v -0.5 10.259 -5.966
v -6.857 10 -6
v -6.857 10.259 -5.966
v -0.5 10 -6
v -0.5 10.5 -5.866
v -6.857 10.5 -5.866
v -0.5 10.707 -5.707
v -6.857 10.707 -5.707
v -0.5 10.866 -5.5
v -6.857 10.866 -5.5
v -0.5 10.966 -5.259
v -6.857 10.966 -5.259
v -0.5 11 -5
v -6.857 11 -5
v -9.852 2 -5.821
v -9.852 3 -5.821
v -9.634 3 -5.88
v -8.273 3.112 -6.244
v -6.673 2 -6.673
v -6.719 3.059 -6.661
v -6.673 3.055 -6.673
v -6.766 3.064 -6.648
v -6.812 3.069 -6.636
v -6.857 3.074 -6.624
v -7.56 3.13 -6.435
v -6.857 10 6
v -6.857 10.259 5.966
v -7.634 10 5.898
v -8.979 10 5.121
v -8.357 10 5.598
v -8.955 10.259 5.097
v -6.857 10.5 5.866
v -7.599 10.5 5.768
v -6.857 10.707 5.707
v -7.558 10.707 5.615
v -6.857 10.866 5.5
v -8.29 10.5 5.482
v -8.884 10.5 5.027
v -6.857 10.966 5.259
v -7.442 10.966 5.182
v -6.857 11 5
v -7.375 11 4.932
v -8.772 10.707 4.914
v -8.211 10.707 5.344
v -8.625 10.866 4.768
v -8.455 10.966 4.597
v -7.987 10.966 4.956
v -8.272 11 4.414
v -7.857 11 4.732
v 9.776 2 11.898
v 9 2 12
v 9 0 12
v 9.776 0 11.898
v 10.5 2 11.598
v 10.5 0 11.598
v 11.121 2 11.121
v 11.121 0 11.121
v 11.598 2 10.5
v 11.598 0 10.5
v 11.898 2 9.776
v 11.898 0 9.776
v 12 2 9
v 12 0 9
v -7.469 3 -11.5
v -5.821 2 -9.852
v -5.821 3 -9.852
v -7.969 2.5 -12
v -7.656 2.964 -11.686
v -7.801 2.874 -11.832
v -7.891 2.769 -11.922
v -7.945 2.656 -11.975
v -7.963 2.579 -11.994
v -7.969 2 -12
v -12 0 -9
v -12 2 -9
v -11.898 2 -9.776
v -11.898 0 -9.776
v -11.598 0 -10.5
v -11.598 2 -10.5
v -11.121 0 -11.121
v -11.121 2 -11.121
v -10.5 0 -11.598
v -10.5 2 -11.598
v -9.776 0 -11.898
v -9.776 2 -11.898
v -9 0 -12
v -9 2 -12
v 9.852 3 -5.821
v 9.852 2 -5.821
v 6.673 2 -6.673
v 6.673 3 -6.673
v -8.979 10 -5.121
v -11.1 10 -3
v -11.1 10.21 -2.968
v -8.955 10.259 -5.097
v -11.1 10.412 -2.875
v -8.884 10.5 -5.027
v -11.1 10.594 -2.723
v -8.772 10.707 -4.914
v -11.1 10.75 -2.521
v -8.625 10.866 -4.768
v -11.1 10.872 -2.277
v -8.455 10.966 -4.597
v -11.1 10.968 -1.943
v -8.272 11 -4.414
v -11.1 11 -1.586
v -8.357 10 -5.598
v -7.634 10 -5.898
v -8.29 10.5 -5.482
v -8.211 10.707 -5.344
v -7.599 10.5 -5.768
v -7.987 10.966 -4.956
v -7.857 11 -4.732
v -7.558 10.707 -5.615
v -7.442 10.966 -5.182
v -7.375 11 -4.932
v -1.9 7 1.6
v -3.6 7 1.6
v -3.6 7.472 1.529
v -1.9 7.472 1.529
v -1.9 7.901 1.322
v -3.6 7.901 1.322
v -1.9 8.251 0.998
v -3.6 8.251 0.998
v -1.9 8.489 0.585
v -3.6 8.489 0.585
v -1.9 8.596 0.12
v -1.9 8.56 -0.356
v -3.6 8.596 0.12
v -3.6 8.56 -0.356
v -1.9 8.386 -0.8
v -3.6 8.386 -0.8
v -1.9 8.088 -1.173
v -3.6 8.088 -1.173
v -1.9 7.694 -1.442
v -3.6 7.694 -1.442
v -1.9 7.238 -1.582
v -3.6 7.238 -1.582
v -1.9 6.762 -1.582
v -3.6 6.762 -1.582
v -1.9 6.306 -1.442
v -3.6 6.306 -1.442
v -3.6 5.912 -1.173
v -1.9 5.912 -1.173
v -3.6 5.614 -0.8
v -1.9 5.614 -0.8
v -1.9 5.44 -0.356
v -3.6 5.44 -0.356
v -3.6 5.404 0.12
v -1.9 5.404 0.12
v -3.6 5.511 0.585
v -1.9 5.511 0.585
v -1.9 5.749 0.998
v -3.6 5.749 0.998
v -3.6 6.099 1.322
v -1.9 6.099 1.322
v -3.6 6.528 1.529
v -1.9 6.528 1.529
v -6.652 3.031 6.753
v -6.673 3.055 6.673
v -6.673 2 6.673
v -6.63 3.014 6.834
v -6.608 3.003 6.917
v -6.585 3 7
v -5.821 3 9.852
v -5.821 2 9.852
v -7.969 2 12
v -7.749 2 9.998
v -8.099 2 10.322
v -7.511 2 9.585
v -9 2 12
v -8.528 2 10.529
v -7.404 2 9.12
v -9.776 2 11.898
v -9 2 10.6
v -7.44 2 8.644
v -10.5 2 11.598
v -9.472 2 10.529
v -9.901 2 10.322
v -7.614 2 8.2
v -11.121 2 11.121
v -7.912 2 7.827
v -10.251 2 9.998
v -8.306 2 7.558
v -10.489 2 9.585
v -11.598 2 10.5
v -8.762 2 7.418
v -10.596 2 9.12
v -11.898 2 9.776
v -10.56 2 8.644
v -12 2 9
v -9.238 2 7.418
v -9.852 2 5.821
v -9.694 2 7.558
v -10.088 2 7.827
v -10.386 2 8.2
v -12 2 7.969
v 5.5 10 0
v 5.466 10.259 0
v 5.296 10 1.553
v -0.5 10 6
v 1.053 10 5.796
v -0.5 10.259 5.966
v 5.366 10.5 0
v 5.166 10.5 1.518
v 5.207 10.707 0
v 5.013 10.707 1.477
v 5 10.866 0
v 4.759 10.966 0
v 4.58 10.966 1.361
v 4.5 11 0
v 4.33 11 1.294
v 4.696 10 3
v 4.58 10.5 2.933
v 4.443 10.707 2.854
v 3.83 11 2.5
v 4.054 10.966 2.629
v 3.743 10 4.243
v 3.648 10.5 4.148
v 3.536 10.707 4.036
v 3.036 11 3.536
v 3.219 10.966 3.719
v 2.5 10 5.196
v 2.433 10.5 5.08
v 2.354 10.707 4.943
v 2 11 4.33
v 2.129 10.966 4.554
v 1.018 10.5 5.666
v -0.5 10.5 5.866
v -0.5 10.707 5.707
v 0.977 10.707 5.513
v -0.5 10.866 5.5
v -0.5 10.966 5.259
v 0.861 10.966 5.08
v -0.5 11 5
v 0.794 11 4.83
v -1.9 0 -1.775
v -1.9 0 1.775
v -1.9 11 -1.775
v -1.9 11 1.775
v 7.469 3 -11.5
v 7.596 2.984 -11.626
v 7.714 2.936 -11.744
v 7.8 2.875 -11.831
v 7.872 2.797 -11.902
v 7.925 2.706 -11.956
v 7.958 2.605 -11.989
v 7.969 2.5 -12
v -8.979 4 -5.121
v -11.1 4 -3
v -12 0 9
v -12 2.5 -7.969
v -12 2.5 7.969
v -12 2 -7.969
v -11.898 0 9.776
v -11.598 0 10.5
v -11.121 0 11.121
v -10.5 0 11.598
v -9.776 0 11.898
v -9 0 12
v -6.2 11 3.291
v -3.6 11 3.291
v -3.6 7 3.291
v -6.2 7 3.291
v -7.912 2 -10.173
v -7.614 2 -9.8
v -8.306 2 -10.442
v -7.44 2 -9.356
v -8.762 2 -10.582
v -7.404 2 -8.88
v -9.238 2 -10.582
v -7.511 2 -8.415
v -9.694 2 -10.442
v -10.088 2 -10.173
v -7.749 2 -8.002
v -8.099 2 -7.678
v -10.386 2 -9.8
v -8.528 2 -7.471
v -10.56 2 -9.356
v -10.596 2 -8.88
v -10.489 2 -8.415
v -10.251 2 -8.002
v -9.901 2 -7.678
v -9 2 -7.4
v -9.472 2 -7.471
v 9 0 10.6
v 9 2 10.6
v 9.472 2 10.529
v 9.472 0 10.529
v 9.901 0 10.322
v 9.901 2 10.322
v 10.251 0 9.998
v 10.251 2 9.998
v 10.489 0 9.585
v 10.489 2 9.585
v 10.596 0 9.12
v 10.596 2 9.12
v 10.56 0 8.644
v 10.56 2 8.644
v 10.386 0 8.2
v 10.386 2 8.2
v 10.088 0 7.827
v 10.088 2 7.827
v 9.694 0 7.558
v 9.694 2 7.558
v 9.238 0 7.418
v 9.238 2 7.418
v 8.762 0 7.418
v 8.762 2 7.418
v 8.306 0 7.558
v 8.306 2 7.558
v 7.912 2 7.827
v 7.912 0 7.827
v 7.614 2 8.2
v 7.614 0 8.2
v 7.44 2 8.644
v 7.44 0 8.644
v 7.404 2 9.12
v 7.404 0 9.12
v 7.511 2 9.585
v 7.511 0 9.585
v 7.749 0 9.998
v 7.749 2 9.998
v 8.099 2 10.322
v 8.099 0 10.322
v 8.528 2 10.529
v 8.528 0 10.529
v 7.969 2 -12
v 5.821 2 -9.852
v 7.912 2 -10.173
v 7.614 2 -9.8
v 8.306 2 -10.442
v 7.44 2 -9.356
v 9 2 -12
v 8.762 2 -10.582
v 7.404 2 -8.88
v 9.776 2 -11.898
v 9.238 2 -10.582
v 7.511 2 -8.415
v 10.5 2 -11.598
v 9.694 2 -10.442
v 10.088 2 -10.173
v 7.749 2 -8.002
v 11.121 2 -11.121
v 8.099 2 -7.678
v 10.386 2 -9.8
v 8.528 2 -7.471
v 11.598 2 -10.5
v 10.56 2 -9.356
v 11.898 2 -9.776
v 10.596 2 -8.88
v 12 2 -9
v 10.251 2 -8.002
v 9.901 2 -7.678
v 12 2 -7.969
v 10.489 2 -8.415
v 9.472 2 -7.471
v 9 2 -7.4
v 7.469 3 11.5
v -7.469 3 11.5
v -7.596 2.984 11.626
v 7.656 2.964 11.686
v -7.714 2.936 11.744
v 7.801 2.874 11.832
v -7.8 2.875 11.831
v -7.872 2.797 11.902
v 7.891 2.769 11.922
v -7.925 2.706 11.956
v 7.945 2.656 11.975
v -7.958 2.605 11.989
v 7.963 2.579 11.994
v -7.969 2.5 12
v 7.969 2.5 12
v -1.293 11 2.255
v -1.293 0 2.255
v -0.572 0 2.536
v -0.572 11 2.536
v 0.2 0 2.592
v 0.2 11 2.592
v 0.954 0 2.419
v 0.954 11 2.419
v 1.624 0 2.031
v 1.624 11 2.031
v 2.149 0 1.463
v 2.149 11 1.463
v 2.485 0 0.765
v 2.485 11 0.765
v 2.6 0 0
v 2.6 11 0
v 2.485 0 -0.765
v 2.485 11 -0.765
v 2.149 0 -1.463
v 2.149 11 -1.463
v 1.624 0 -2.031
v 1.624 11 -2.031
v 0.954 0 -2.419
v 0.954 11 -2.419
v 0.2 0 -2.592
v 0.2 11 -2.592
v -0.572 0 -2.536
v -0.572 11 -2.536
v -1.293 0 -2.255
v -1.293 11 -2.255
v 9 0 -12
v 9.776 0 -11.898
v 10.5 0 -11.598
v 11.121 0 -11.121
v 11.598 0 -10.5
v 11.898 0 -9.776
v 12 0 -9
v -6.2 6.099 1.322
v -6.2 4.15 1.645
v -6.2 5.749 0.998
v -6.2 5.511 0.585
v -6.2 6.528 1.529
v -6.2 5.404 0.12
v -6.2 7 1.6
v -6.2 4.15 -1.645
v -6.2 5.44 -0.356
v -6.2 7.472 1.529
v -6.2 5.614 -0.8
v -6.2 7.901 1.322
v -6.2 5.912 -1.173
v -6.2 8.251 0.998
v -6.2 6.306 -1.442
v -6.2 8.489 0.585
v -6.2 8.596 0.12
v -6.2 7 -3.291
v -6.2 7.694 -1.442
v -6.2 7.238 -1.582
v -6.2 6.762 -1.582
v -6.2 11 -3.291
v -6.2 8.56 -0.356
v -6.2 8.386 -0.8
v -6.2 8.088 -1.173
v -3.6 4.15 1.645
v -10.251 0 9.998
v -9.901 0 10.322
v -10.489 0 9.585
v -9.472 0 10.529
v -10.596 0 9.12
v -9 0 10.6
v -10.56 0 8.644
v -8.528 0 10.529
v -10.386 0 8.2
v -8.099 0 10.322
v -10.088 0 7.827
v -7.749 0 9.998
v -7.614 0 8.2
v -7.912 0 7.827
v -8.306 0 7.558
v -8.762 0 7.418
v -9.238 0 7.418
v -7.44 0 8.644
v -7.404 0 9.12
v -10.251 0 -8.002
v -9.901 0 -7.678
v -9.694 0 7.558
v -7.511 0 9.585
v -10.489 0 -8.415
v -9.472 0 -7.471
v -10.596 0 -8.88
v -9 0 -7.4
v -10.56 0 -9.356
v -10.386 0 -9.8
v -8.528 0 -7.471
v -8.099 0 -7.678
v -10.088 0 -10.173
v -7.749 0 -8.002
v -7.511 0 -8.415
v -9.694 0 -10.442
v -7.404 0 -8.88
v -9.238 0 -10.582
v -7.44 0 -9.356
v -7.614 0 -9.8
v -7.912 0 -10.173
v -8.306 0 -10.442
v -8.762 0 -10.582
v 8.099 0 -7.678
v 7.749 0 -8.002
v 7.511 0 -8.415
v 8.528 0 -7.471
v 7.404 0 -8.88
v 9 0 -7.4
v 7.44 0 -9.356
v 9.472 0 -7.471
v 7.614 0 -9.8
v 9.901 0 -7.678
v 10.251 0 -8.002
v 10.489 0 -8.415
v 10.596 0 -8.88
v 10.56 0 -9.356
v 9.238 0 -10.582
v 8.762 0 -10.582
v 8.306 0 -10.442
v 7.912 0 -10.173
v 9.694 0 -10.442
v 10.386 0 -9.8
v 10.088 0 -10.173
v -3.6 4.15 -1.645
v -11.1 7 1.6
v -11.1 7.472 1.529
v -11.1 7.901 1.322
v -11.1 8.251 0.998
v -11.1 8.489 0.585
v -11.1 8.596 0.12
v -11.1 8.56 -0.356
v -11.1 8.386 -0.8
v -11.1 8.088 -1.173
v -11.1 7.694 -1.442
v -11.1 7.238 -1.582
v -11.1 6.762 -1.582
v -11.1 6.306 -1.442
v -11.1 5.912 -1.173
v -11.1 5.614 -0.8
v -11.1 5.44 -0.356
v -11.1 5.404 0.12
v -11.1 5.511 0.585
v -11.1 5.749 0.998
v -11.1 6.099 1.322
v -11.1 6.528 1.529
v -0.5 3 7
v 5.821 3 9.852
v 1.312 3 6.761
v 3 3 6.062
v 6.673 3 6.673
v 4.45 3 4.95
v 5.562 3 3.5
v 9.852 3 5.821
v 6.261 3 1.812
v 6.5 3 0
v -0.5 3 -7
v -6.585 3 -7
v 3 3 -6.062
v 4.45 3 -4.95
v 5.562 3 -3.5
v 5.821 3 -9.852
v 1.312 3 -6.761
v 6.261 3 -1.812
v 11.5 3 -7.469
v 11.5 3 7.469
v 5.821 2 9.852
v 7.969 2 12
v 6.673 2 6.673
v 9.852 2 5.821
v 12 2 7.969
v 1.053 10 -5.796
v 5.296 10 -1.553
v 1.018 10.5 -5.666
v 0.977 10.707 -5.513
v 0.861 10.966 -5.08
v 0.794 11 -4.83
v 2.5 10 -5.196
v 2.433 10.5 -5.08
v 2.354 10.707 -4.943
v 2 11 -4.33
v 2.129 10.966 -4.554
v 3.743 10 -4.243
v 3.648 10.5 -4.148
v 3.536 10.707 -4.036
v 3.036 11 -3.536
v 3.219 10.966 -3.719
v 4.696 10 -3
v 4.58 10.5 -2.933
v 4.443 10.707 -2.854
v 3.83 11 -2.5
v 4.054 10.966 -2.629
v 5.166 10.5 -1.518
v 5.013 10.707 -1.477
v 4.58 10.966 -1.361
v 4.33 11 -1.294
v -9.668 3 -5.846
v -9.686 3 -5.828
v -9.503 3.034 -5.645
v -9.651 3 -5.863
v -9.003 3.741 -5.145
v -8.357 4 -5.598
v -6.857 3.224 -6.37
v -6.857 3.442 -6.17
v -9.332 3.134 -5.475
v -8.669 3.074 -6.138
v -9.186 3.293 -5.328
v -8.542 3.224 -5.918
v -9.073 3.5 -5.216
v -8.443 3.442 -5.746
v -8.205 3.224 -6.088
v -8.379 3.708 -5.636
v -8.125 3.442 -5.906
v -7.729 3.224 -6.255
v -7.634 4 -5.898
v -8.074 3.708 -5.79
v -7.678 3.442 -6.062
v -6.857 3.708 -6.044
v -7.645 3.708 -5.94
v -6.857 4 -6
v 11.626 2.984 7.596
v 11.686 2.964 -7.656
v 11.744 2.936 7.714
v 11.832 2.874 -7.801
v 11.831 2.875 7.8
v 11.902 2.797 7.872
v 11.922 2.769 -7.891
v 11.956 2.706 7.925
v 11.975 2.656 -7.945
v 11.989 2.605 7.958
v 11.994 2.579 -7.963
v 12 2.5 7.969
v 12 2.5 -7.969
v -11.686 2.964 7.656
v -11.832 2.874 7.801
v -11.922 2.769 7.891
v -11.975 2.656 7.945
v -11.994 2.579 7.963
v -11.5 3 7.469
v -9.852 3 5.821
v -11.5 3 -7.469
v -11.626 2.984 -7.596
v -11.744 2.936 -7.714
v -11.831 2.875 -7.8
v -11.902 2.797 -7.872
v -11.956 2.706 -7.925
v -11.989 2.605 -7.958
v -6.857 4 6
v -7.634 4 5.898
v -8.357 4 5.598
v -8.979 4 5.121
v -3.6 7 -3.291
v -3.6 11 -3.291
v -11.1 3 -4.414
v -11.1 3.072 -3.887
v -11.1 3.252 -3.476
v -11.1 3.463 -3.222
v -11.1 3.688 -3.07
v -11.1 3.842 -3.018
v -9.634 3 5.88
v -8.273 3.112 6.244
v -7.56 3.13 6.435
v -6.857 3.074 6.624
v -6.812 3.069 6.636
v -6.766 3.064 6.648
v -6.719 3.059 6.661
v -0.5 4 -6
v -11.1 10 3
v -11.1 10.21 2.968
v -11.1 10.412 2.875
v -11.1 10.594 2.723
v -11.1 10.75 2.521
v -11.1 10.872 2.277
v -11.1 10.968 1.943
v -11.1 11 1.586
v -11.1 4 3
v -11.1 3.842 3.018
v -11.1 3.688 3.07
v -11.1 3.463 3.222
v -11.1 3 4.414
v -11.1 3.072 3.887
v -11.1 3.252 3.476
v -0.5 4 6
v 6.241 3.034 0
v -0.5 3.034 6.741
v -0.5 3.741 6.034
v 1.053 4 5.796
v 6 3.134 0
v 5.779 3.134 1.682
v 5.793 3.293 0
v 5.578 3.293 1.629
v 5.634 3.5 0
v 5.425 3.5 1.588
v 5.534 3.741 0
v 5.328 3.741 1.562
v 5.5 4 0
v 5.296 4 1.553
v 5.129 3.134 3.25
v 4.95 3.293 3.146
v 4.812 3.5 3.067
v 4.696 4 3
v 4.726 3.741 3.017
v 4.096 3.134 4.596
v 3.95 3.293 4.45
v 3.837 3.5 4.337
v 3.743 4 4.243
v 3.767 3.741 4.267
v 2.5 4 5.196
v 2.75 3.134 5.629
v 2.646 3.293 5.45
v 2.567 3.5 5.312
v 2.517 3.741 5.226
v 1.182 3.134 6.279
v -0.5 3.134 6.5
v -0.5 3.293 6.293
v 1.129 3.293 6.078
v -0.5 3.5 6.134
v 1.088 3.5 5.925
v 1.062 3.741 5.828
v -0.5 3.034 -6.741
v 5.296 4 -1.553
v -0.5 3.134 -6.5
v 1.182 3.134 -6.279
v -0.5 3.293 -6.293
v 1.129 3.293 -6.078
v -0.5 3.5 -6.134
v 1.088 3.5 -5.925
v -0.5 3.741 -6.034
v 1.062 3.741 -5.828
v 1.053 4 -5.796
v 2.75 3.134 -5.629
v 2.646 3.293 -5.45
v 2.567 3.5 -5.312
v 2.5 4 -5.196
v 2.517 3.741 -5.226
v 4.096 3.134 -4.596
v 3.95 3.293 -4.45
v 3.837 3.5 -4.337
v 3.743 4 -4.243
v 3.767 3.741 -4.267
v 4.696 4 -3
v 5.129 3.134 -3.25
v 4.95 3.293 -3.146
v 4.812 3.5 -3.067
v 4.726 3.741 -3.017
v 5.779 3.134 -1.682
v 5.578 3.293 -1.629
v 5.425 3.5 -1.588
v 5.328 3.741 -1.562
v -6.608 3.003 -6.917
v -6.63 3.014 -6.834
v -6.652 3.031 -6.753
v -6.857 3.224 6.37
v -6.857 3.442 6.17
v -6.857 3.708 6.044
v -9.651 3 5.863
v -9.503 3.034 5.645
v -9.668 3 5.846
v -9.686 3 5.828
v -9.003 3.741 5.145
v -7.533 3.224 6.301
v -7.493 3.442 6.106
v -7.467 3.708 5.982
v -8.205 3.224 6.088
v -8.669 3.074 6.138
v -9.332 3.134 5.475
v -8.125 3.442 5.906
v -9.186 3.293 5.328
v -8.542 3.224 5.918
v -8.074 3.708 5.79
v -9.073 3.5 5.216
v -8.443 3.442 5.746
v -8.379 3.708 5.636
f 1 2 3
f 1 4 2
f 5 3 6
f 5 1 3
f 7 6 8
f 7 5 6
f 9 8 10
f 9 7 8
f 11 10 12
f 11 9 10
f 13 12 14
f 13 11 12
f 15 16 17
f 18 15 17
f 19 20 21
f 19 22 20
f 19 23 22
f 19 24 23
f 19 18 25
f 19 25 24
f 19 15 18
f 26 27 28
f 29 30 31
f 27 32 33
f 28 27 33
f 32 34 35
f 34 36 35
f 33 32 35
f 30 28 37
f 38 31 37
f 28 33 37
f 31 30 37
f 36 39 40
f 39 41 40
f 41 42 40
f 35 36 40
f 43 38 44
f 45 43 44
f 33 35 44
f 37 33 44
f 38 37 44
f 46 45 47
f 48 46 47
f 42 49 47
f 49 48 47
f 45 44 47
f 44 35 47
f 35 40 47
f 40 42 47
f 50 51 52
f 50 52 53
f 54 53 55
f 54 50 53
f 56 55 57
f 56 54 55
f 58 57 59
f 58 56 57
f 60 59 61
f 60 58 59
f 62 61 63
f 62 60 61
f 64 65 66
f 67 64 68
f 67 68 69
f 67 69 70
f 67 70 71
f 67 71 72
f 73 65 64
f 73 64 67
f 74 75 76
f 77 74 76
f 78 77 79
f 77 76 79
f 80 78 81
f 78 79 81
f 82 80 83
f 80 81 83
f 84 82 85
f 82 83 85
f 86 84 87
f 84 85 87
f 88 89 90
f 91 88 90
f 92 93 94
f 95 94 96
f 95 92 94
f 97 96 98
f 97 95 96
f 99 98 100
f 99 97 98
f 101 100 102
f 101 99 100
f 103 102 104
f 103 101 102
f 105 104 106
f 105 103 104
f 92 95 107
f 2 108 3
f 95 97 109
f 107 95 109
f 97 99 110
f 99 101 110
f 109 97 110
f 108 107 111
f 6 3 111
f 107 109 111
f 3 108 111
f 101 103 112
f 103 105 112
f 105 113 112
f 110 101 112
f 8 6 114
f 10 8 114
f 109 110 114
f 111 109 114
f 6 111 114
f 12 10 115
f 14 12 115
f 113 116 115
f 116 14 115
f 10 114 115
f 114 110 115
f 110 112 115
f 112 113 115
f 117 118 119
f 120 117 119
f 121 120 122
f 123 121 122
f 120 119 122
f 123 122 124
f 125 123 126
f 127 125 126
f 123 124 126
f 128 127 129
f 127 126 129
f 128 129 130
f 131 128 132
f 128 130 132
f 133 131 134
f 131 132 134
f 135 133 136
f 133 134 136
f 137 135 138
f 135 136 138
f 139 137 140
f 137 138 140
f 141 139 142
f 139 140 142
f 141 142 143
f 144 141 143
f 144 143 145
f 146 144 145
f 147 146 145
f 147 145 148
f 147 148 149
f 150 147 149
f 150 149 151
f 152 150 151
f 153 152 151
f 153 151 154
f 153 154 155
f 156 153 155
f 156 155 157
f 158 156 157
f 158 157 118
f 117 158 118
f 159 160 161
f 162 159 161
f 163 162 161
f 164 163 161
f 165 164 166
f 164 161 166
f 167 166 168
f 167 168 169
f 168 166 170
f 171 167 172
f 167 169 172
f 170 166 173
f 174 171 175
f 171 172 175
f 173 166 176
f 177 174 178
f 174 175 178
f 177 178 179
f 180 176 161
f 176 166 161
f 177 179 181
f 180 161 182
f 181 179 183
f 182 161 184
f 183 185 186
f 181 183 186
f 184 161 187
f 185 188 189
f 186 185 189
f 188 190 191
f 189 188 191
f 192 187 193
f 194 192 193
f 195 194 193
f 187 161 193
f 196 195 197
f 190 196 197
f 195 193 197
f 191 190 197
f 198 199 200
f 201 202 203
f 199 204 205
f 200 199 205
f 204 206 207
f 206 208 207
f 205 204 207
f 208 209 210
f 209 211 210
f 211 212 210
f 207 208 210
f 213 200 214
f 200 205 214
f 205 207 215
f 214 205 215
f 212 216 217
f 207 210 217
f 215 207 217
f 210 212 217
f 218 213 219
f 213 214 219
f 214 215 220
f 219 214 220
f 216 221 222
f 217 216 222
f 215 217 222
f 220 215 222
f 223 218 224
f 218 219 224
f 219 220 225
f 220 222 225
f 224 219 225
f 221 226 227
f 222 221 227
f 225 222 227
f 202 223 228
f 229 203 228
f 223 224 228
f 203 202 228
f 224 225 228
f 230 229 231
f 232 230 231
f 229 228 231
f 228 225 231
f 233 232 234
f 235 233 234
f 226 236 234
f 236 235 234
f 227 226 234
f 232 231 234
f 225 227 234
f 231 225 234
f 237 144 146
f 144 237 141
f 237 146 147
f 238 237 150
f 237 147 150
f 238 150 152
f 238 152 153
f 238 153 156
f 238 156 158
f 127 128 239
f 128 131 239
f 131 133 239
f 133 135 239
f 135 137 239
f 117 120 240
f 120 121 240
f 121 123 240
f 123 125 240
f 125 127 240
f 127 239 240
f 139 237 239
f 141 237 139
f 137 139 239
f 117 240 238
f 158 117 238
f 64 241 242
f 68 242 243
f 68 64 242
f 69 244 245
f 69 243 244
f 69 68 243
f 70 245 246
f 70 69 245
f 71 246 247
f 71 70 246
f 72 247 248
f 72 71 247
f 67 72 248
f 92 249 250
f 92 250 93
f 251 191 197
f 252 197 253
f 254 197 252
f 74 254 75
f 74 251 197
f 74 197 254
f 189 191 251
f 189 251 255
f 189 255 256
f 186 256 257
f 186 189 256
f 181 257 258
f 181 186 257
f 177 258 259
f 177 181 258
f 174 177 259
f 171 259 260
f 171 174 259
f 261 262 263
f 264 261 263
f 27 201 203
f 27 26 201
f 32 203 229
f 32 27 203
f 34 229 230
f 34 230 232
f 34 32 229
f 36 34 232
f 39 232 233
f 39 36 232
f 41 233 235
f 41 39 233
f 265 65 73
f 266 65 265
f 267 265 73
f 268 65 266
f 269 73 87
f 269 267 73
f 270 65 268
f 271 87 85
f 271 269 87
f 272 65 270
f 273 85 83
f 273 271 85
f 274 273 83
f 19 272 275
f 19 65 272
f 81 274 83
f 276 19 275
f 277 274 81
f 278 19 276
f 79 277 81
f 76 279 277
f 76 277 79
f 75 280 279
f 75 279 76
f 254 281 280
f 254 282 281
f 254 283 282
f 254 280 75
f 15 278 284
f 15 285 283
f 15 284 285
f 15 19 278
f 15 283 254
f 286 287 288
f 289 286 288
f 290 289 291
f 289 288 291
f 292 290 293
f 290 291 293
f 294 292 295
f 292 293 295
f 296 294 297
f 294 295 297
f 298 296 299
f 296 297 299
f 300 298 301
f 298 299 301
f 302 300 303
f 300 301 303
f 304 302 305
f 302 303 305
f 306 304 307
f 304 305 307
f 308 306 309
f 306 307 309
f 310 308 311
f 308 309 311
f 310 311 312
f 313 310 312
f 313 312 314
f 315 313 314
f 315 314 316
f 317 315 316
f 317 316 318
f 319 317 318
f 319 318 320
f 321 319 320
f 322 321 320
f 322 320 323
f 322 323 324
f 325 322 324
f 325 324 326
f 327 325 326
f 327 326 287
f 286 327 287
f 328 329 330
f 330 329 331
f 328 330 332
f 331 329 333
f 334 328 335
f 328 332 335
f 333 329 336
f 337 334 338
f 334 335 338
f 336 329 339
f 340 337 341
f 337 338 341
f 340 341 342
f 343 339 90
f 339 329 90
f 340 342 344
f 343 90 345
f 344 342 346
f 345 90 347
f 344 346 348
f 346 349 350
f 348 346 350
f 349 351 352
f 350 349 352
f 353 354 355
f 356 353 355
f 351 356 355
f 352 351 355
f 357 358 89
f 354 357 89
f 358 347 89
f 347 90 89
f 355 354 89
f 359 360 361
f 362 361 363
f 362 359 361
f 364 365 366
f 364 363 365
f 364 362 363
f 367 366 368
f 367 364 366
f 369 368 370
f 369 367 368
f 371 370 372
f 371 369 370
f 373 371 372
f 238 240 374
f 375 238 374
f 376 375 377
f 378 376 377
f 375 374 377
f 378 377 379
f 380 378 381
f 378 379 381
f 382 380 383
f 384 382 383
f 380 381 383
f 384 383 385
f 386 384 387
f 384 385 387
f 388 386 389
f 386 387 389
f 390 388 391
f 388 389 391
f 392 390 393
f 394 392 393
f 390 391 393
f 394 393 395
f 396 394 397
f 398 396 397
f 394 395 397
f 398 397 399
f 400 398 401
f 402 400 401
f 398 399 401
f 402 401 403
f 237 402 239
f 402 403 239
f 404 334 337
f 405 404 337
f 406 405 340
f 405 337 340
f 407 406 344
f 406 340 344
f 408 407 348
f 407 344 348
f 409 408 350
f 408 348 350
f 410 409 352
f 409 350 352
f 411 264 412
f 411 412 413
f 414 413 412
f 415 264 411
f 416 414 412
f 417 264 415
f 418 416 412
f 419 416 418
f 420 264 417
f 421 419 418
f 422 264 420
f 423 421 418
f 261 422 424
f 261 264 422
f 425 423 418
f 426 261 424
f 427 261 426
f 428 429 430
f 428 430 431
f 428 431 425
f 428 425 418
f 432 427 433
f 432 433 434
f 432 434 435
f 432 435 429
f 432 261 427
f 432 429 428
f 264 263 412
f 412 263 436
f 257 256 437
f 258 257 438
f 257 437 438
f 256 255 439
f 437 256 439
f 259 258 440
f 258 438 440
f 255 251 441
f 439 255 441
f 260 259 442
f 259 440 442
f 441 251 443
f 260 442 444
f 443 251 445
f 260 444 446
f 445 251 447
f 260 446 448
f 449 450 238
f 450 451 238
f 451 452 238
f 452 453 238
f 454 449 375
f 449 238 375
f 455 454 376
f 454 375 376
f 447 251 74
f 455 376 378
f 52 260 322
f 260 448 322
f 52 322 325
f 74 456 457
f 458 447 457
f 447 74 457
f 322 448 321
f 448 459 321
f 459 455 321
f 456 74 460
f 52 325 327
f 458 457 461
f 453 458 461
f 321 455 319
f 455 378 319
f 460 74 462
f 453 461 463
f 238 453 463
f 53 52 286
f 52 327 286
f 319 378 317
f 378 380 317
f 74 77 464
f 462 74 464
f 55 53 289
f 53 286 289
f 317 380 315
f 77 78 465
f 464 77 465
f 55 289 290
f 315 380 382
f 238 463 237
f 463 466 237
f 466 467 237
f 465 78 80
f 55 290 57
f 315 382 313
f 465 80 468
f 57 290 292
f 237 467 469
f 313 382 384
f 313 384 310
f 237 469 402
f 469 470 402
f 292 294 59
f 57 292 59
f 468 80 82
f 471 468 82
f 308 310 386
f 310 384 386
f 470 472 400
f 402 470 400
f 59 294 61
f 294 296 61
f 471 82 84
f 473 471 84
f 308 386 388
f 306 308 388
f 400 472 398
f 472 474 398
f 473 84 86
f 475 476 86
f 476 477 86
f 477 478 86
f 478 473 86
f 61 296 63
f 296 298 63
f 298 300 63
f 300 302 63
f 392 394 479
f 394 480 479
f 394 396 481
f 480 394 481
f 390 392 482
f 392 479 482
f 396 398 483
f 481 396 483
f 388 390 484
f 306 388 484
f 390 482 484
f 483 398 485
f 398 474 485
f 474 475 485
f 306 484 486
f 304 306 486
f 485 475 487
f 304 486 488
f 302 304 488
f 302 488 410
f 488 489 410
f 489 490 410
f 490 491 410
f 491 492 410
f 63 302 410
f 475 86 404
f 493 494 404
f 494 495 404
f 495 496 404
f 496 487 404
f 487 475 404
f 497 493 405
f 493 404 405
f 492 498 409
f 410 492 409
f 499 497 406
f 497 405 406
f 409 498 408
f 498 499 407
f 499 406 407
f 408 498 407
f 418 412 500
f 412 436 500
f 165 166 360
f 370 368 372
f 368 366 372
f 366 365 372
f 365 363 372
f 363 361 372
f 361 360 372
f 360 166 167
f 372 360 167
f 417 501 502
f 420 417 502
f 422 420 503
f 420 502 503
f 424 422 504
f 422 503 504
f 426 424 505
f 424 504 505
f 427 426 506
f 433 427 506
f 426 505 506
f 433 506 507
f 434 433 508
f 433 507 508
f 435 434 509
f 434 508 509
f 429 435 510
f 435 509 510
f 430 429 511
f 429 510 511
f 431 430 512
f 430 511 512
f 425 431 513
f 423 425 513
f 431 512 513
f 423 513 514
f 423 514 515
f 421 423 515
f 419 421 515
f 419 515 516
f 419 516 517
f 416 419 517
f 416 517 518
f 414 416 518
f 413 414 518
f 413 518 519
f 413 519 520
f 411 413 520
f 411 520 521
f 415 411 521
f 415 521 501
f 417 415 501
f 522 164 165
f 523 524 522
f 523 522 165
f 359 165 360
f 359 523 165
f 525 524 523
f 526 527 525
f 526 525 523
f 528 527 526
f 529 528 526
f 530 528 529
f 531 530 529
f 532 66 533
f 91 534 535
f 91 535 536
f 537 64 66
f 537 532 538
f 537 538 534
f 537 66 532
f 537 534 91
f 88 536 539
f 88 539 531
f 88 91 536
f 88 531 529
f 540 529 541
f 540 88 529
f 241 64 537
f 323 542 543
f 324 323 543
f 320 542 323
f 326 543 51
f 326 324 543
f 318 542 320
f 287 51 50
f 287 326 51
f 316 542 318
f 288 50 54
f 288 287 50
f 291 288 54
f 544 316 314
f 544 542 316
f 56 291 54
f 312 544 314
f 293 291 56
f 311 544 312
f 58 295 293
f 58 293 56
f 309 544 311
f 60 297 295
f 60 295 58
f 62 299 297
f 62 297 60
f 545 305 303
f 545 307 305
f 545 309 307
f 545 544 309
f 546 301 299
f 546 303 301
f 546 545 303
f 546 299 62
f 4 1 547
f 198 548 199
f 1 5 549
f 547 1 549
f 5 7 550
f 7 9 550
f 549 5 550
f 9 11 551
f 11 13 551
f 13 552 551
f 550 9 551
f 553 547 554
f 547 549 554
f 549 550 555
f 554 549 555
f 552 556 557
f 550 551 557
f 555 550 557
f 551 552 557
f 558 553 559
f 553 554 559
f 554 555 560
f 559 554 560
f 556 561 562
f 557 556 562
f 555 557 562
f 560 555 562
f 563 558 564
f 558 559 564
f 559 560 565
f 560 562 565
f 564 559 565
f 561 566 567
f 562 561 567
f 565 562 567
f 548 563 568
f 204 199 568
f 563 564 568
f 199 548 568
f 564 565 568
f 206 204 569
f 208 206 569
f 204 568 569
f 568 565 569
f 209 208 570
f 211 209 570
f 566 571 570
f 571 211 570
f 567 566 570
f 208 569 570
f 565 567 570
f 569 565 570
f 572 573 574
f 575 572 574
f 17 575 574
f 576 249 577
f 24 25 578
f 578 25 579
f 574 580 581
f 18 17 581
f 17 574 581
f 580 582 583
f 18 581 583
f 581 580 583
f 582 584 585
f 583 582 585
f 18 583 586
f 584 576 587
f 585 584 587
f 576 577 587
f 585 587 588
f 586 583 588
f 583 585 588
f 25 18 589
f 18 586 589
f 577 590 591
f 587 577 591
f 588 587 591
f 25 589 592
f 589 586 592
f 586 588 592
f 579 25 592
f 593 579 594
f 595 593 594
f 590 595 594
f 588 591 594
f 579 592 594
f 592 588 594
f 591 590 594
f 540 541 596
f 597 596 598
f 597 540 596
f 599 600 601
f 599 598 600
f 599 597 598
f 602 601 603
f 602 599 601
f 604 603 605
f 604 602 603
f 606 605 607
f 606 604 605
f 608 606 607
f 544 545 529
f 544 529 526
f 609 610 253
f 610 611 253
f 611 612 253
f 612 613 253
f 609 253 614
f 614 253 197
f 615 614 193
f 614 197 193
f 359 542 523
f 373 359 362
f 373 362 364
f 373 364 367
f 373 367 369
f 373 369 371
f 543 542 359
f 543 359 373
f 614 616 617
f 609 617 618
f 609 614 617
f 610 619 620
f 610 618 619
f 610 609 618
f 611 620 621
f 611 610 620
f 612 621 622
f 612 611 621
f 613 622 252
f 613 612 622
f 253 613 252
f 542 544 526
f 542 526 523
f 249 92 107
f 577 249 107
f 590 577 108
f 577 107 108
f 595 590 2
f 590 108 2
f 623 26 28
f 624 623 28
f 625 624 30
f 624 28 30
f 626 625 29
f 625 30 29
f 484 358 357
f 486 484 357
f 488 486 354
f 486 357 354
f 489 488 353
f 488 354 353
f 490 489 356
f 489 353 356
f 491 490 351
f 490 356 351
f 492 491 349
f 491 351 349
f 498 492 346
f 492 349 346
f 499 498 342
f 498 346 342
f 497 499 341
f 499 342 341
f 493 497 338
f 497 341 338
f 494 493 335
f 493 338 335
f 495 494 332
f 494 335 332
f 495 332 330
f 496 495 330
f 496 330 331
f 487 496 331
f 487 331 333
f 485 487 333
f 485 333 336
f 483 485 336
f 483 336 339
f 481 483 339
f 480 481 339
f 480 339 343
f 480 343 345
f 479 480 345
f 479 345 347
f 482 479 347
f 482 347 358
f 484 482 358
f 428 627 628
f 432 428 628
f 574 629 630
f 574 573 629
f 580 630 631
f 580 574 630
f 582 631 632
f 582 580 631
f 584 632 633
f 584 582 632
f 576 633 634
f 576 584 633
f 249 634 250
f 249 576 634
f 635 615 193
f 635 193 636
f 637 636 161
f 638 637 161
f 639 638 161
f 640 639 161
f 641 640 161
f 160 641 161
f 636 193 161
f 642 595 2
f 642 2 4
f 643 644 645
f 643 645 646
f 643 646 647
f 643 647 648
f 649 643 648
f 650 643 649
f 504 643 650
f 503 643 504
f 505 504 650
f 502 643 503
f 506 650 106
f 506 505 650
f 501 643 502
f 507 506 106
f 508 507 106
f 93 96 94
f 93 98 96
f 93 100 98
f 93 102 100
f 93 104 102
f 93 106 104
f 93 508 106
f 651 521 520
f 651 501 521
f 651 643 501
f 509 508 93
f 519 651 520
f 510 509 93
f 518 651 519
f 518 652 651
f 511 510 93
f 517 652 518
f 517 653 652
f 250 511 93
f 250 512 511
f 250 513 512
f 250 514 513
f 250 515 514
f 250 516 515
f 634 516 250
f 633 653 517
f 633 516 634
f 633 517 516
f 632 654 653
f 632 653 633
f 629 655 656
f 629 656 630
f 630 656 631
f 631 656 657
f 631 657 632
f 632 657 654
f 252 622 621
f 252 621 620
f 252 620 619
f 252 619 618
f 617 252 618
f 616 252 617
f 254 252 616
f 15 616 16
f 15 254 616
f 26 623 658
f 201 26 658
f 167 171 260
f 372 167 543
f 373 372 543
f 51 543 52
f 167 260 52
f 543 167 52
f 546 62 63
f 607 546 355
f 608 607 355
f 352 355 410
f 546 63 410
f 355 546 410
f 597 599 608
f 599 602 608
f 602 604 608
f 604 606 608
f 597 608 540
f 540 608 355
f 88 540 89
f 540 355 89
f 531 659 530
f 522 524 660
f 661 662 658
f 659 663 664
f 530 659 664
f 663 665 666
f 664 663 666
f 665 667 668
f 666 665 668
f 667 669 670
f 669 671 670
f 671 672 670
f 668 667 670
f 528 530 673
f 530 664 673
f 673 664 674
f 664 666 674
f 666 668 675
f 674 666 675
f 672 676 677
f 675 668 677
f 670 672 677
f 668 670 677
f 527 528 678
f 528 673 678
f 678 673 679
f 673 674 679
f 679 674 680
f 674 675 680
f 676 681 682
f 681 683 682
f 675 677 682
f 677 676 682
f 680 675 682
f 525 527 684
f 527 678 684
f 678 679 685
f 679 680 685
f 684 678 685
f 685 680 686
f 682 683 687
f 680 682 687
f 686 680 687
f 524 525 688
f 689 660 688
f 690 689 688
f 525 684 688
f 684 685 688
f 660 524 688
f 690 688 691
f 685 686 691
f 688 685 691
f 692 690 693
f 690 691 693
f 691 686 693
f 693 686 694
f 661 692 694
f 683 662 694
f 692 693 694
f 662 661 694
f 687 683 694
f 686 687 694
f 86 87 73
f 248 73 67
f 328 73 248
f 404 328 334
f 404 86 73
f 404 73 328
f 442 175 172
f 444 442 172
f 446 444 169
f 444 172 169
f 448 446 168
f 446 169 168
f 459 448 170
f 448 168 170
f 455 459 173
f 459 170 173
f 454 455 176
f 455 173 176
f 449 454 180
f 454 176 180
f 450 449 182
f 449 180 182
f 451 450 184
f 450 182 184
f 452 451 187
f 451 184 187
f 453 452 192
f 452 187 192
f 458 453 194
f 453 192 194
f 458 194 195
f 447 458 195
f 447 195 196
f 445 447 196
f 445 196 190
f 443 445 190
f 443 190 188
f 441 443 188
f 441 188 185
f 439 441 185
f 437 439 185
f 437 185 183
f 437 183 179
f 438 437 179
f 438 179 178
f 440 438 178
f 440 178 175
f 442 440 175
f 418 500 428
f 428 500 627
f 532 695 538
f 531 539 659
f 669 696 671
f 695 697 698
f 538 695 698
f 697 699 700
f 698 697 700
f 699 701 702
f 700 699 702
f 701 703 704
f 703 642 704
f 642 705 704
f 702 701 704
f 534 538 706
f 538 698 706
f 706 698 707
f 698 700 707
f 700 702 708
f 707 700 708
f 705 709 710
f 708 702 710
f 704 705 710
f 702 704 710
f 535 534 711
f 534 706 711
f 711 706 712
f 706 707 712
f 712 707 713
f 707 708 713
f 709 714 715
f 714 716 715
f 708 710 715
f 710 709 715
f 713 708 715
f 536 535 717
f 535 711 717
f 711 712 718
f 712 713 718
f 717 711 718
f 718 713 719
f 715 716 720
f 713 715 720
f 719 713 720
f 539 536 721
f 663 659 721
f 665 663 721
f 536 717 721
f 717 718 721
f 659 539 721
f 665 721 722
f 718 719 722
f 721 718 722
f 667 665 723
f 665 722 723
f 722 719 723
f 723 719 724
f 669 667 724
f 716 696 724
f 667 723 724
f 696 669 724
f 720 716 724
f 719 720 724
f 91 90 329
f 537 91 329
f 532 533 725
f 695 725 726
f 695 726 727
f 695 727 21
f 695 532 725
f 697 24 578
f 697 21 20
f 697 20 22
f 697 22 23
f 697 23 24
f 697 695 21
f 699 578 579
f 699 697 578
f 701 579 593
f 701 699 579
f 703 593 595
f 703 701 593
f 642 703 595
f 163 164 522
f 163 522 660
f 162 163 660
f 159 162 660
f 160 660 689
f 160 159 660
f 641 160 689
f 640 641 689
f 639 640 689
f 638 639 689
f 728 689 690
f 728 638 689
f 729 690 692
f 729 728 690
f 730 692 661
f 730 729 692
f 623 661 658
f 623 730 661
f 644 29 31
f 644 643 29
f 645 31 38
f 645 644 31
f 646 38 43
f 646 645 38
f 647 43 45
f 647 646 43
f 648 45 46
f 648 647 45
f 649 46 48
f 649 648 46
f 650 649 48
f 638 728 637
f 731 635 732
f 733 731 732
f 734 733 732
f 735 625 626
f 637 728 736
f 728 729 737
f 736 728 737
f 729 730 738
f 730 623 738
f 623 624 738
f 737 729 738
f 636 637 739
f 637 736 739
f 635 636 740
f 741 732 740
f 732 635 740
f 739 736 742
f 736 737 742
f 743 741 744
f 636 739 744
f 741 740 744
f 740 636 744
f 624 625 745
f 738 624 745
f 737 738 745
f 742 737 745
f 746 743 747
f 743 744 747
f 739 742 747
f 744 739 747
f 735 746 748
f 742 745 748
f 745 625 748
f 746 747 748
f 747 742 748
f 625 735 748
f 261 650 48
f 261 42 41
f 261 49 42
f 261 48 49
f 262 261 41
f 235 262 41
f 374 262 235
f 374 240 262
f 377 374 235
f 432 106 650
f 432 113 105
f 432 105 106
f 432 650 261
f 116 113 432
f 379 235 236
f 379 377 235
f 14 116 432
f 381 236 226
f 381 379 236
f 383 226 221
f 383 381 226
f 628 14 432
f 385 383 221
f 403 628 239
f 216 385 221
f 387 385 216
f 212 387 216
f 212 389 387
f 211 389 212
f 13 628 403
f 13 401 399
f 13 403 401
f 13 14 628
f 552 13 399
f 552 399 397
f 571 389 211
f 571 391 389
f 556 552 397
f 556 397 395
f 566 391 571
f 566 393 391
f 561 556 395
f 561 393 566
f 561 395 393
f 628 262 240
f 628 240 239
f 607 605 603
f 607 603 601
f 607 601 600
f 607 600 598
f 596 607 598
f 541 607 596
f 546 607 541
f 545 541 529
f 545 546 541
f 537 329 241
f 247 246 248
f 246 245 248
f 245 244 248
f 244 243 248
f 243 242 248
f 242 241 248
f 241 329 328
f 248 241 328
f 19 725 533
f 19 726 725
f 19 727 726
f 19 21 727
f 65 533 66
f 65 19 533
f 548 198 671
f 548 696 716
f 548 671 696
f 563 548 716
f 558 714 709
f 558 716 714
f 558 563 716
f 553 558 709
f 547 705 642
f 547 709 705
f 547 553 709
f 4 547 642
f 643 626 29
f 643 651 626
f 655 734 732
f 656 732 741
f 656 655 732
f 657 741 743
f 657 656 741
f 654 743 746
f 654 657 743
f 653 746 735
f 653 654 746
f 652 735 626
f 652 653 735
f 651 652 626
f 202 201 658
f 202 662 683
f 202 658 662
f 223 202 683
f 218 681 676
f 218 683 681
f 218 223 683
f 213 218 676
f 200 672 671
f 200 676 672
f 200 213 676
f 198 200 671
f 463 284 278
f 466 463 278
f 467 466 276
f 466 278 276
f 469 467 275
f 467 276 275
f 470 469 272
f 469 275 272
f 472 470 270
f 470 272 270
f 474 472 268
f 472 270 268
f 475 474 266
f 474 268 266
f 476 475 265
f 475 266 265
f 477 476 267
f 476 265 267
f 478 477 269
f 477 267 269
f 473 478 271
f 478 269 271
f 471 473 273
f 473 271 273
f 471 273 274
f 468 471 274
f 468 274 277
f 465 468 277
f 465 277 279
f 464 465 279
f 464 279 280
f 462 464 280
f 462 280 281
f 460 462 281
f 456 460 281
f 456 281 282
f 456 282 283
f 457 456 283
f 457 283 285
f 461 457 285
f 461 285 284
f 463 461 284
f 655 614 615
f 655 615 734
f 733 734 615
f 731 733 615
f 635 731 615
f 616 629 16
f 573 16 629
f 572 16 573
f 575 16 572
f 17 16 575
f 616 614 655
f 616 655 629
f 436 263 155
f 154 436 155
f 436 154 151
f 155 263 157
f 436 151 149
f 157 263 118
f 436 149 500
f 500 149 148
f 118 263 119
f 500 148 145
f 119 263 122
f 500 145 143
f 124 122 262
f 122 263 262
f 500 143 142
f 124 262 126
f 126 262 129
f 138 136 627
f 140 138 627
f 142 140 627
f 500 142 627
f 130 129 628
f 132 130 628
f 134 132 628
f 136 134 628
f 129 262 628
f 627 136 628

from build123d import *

# Parameters (mm, degrees)
SKETCH1_W            = 24
SKETCH1_H            = 24
BOSS_EXTRUDE1_DEPTH  = 3
SKETCH2_W            = 16.6
SKETCH2_H            = 12
BOSS_EXTRUDE2_DEPTH  = 8
CUT_EXTRUDE1_DEPTH   = 21.223748416
CUT_EXTRUDE2_REACH   = 30.26
SKETCH4_R            = 1.6
CUT_EXTRUDE3_DEPTH   = 1.3
FILLET3_R            = 6
CHAMFER3_SIZE        = 3
FILLET4_R            = 3
FILLET6_R            = 1
SKETCH9_R            = 1.6
CUT_EXTRUDE5_DEPTH   = 19.761663039
FILLET8_R            = 3
FILLET9_R            = 0.5
CUT_EXTRUDE6_START   = -1
CUT_EXTRUDE6_DEPTH   = 20.761663103
MIRROR2_START        = -1
MIRROR2_COPY_1_DEPTH = 20.761663103


with BuildPart() as part:
    # Sketch1 → Boss-Extrude1 (new body)
    with BuildSketch(Plane(origin=(0, 0, 0), x_dir=(1, 0, 0), z_dir=(0, 1, 0))):
        Rectangle(SKETCH1_W, SKETCH1_H)
    extrude(amount=BOSS_EXTRUDE1_DEPTH)

    # Sketch2 → Boss-Extrude2 (add)
    with BuildSketch(Plane(origin=(0, 3, 0), x_dir=(1, 0, 0), z_dir=(0, 1, 0))):
        with Locations((-2.8, 0)):
            Rectangle(SKETCH2_W, SKETCH2_H)
    extrude(amount=BOSS_EXTRUDE2_DEPTH)

    # Sketch3 → Cut-Extrude1 (cut, through all)
    with BuildSketch(Plane(origin=(0, 11, 0), x_dir=(1, 0, 0), z_dir=(0, 1, 0))):
        with BuildLine():
            Line((-1.9, 1.774823935), (-1.9, -1.774823935))
            ThreePointArc((-1.9, -1.774823935), (2.6, 0), (-1.9, 1.774823935))
        make_face()
    extrude(amount=-CUT_EXTRUDE1_DEPTH, mode=Mode.SUBTRACT)

    # Sketch4 → Cut-Extrude2 (cut, up to next)
    with BuildSketch(Plane.ZY.offset(11.1), mode=Mode.PRIVATE) as cut_extrude2_sk1:
        with Locations((0, 7)):
            Circle(SKETCH4_R)
    cut_extrude2_tool1 = extrude(cut_extrude2_sk1.sketch, amount=-CUT_EXTRUDE2_REACH, mode=Mode.PRIVATE) & part.part
    add(cut_extrude2_tool1.solids().sort_by_distance((-11.1, 7, 0))[0], mode=Mode.SUBTRACT)

    # Sketch5 → Cut-Extrude3 (cut, symmetric)
    with BuildSketch(Plane(origin=(-4.9, 0, 0), x_dir=(0, 0, -1), z_dir=(1, 0, 0))):
        Polygon((1.645448267, 4.15), (3.290896534, 7), (3.290896534, 11), (-3.290896534, 11), (-3.290896534, 7), (-1.645448267, 4.15), align=None)
    extrude(amount=CUT_EXTRUDE3_DEPTH, both=True, mode=Mode.SUBTRACT)

    # Fillet3
    fillet3_edges = [part.edges().sort_by_distance(p)[0] for p in [
        (5.5, 7, 6),
        (5.5, 7, -6),
    ]]
    fillet(fillet3_edges, radius=FILLET3_R - 0.0001)  # a hair under: the kernel refuses the full size

    # Chamfer3
    chamfer3_edges = [part.edges().sort_by_distance(p)[0] for p in [
        (-11.1, 7, -6),
        (-11.1, 7, 6),
    ]]
    chamfer(chamfer3_edges, length=CHAMFER3_SIZE)

    # Fillet4
    fillet4_edges = [part.edges().sort_by_distance(p)[0] for p in [
        (-8.1, 7, -6),
        (-8.1, 7, 6),
    ]]
    fillet(fillet4_edges, radius=FILLET4_R)

    # Fillet6
    fillet6_edges = [part.edges().sort_by_distance(p)[0] for p in [
        (-3.678629656, 11, -6),
        (3.742669976, 11, -4.242669976),
        (3.742669976, 11, 4.242669976),
        (-3.678629656, 3, -6),
        (3.742669976, 3, 4.242669976),
        (3.742669976, 3, -4.242669976),
        (-10.039339828, 11, 4.060660172),
        (-10.039339828, 3, -4.060660172),
        (-3.678629656, 11, 6),
        (-3.678629656, 3, 6),
        (-10.039339828, 3, 4.060660172),
        (-10.039339828, 11, -4.060660172),
        (-8.00540961, 11, -5.771638598),
        (-8.00540961, 11, 5.771638598),
        (-8.00540961, 3, 5.771638598),
        (-8.00540961, 3, -5.771638598),
    ]]
    fillet(fillet6_edges, radius=FILLET6_R)

    # Sketch9 → Cut-Extrude5 (cut, through all)
    with BuildSketch(Plane(origin=(0, 3, 0), x_dir=(1, 0, 0), z_dir=(0, 1, 0))):
        with Locations(Location((-9, 9, 0), (0, 0, 270))):
            Circle(SKETCH9_R)
        with Locations(Location((9, 9, 0), (0, 0, 270))):
            Circle(SKETCH9_R)
        with Locations(Location((9, -9, 0), (0, 0, 270))):
            Circle(SKETCH9_R)
        with Locations(Location((-9, -9, 0), (0, 0, 270))):
            Circle(SKETCH9_R)
    extrude(amount=-CUT_EXTRUDE5_DEPTH, mode=Mode.SUBTRACT)

    # Fillet8
    fillet8_edges = [part.edges().sort_by_distance(p)[0] for p in [
        (-12, 1.5, -12),
        (12, 1.5, -12),
        (12, 1.5, 12),
        (-12, 1.5, 12),
    ]]
    fillet(fillet8_edges, radius=FILLET8_R)

    # Fillet9
    fillet9_edges = [part.edges().sort_by_distance(p)[0] for p in [
        (12, 3, 0),
        (0, 3, 12),
        (-12, 3, 0),
        (0, 3, -12),
        (-11.121320344, 3, 11.121320344),
        (-11.121320344, 3, -11.121320344),
        (11.121320344, 3, -11.121320344),
        (11.121320344, 3, 11.121320344),
    ]]
    fillet(fillet9_edges, radius=FILLET9_R)

    # Sketch10 → Cut-Extrude6 (cut)
    with BuildSketch(Plane(origin=(0, 3, 0), x_dir=(1, 0, 0), z_dir=(0, 1, 0)).offset(CUT_EXTRUDE6_START)):
        Polygon((5.821238046, -9.851746699), (8.148253301, -12.178761954), (9.106066017, -13.13657467), (13.13657467, -9.106066017), (12.178761954, -8.148253301), (9.851746699, -5.821238046), (6.672984744, -6.672984744), align=None)
    cut_extrude6 = extrude(amount=CUT_EXTRUDE6_DEPTH, mode=Mode.SUBTRACT)

    # Mirror1: Cut-Extrude6 across plane
    add(cut_extrude6.mirror(Plane.XY), mode=Mode.SUBTRACT)

    # Mirror2: Cut-Extrude6 across plane
    add(cut_extrude6.mirror(Plane(origin=(0, 0, 0), x_dir=(0, 0, 1), z_dir=(1, 0, 0))), mode=Mode.SUBTRACT)

    # Mirror2 copy 1 sketch → Mirror2 copy 1 (cut)
    with BuildSketch(Plane(origin=(0, 3, 0), x_dir=(-1, 0, 0), z_dir=(0, 1, 0)).offset(MIRROR2_START)):
        Polygon((5.821238046, -9.851746699), (8.148253301, -12.178761954), (9.106066017, -13.13657467), (13.13657467, -9.106066017), (12.178761954, -8.148253301), (9.851746699, -5.821238046), (6.672984744, -6.672984744), align=None)
    extrude(amount=MIRROR2_COPY_1_DEPTH, mode=Mode.SUBTRACT)


solid = part.part
